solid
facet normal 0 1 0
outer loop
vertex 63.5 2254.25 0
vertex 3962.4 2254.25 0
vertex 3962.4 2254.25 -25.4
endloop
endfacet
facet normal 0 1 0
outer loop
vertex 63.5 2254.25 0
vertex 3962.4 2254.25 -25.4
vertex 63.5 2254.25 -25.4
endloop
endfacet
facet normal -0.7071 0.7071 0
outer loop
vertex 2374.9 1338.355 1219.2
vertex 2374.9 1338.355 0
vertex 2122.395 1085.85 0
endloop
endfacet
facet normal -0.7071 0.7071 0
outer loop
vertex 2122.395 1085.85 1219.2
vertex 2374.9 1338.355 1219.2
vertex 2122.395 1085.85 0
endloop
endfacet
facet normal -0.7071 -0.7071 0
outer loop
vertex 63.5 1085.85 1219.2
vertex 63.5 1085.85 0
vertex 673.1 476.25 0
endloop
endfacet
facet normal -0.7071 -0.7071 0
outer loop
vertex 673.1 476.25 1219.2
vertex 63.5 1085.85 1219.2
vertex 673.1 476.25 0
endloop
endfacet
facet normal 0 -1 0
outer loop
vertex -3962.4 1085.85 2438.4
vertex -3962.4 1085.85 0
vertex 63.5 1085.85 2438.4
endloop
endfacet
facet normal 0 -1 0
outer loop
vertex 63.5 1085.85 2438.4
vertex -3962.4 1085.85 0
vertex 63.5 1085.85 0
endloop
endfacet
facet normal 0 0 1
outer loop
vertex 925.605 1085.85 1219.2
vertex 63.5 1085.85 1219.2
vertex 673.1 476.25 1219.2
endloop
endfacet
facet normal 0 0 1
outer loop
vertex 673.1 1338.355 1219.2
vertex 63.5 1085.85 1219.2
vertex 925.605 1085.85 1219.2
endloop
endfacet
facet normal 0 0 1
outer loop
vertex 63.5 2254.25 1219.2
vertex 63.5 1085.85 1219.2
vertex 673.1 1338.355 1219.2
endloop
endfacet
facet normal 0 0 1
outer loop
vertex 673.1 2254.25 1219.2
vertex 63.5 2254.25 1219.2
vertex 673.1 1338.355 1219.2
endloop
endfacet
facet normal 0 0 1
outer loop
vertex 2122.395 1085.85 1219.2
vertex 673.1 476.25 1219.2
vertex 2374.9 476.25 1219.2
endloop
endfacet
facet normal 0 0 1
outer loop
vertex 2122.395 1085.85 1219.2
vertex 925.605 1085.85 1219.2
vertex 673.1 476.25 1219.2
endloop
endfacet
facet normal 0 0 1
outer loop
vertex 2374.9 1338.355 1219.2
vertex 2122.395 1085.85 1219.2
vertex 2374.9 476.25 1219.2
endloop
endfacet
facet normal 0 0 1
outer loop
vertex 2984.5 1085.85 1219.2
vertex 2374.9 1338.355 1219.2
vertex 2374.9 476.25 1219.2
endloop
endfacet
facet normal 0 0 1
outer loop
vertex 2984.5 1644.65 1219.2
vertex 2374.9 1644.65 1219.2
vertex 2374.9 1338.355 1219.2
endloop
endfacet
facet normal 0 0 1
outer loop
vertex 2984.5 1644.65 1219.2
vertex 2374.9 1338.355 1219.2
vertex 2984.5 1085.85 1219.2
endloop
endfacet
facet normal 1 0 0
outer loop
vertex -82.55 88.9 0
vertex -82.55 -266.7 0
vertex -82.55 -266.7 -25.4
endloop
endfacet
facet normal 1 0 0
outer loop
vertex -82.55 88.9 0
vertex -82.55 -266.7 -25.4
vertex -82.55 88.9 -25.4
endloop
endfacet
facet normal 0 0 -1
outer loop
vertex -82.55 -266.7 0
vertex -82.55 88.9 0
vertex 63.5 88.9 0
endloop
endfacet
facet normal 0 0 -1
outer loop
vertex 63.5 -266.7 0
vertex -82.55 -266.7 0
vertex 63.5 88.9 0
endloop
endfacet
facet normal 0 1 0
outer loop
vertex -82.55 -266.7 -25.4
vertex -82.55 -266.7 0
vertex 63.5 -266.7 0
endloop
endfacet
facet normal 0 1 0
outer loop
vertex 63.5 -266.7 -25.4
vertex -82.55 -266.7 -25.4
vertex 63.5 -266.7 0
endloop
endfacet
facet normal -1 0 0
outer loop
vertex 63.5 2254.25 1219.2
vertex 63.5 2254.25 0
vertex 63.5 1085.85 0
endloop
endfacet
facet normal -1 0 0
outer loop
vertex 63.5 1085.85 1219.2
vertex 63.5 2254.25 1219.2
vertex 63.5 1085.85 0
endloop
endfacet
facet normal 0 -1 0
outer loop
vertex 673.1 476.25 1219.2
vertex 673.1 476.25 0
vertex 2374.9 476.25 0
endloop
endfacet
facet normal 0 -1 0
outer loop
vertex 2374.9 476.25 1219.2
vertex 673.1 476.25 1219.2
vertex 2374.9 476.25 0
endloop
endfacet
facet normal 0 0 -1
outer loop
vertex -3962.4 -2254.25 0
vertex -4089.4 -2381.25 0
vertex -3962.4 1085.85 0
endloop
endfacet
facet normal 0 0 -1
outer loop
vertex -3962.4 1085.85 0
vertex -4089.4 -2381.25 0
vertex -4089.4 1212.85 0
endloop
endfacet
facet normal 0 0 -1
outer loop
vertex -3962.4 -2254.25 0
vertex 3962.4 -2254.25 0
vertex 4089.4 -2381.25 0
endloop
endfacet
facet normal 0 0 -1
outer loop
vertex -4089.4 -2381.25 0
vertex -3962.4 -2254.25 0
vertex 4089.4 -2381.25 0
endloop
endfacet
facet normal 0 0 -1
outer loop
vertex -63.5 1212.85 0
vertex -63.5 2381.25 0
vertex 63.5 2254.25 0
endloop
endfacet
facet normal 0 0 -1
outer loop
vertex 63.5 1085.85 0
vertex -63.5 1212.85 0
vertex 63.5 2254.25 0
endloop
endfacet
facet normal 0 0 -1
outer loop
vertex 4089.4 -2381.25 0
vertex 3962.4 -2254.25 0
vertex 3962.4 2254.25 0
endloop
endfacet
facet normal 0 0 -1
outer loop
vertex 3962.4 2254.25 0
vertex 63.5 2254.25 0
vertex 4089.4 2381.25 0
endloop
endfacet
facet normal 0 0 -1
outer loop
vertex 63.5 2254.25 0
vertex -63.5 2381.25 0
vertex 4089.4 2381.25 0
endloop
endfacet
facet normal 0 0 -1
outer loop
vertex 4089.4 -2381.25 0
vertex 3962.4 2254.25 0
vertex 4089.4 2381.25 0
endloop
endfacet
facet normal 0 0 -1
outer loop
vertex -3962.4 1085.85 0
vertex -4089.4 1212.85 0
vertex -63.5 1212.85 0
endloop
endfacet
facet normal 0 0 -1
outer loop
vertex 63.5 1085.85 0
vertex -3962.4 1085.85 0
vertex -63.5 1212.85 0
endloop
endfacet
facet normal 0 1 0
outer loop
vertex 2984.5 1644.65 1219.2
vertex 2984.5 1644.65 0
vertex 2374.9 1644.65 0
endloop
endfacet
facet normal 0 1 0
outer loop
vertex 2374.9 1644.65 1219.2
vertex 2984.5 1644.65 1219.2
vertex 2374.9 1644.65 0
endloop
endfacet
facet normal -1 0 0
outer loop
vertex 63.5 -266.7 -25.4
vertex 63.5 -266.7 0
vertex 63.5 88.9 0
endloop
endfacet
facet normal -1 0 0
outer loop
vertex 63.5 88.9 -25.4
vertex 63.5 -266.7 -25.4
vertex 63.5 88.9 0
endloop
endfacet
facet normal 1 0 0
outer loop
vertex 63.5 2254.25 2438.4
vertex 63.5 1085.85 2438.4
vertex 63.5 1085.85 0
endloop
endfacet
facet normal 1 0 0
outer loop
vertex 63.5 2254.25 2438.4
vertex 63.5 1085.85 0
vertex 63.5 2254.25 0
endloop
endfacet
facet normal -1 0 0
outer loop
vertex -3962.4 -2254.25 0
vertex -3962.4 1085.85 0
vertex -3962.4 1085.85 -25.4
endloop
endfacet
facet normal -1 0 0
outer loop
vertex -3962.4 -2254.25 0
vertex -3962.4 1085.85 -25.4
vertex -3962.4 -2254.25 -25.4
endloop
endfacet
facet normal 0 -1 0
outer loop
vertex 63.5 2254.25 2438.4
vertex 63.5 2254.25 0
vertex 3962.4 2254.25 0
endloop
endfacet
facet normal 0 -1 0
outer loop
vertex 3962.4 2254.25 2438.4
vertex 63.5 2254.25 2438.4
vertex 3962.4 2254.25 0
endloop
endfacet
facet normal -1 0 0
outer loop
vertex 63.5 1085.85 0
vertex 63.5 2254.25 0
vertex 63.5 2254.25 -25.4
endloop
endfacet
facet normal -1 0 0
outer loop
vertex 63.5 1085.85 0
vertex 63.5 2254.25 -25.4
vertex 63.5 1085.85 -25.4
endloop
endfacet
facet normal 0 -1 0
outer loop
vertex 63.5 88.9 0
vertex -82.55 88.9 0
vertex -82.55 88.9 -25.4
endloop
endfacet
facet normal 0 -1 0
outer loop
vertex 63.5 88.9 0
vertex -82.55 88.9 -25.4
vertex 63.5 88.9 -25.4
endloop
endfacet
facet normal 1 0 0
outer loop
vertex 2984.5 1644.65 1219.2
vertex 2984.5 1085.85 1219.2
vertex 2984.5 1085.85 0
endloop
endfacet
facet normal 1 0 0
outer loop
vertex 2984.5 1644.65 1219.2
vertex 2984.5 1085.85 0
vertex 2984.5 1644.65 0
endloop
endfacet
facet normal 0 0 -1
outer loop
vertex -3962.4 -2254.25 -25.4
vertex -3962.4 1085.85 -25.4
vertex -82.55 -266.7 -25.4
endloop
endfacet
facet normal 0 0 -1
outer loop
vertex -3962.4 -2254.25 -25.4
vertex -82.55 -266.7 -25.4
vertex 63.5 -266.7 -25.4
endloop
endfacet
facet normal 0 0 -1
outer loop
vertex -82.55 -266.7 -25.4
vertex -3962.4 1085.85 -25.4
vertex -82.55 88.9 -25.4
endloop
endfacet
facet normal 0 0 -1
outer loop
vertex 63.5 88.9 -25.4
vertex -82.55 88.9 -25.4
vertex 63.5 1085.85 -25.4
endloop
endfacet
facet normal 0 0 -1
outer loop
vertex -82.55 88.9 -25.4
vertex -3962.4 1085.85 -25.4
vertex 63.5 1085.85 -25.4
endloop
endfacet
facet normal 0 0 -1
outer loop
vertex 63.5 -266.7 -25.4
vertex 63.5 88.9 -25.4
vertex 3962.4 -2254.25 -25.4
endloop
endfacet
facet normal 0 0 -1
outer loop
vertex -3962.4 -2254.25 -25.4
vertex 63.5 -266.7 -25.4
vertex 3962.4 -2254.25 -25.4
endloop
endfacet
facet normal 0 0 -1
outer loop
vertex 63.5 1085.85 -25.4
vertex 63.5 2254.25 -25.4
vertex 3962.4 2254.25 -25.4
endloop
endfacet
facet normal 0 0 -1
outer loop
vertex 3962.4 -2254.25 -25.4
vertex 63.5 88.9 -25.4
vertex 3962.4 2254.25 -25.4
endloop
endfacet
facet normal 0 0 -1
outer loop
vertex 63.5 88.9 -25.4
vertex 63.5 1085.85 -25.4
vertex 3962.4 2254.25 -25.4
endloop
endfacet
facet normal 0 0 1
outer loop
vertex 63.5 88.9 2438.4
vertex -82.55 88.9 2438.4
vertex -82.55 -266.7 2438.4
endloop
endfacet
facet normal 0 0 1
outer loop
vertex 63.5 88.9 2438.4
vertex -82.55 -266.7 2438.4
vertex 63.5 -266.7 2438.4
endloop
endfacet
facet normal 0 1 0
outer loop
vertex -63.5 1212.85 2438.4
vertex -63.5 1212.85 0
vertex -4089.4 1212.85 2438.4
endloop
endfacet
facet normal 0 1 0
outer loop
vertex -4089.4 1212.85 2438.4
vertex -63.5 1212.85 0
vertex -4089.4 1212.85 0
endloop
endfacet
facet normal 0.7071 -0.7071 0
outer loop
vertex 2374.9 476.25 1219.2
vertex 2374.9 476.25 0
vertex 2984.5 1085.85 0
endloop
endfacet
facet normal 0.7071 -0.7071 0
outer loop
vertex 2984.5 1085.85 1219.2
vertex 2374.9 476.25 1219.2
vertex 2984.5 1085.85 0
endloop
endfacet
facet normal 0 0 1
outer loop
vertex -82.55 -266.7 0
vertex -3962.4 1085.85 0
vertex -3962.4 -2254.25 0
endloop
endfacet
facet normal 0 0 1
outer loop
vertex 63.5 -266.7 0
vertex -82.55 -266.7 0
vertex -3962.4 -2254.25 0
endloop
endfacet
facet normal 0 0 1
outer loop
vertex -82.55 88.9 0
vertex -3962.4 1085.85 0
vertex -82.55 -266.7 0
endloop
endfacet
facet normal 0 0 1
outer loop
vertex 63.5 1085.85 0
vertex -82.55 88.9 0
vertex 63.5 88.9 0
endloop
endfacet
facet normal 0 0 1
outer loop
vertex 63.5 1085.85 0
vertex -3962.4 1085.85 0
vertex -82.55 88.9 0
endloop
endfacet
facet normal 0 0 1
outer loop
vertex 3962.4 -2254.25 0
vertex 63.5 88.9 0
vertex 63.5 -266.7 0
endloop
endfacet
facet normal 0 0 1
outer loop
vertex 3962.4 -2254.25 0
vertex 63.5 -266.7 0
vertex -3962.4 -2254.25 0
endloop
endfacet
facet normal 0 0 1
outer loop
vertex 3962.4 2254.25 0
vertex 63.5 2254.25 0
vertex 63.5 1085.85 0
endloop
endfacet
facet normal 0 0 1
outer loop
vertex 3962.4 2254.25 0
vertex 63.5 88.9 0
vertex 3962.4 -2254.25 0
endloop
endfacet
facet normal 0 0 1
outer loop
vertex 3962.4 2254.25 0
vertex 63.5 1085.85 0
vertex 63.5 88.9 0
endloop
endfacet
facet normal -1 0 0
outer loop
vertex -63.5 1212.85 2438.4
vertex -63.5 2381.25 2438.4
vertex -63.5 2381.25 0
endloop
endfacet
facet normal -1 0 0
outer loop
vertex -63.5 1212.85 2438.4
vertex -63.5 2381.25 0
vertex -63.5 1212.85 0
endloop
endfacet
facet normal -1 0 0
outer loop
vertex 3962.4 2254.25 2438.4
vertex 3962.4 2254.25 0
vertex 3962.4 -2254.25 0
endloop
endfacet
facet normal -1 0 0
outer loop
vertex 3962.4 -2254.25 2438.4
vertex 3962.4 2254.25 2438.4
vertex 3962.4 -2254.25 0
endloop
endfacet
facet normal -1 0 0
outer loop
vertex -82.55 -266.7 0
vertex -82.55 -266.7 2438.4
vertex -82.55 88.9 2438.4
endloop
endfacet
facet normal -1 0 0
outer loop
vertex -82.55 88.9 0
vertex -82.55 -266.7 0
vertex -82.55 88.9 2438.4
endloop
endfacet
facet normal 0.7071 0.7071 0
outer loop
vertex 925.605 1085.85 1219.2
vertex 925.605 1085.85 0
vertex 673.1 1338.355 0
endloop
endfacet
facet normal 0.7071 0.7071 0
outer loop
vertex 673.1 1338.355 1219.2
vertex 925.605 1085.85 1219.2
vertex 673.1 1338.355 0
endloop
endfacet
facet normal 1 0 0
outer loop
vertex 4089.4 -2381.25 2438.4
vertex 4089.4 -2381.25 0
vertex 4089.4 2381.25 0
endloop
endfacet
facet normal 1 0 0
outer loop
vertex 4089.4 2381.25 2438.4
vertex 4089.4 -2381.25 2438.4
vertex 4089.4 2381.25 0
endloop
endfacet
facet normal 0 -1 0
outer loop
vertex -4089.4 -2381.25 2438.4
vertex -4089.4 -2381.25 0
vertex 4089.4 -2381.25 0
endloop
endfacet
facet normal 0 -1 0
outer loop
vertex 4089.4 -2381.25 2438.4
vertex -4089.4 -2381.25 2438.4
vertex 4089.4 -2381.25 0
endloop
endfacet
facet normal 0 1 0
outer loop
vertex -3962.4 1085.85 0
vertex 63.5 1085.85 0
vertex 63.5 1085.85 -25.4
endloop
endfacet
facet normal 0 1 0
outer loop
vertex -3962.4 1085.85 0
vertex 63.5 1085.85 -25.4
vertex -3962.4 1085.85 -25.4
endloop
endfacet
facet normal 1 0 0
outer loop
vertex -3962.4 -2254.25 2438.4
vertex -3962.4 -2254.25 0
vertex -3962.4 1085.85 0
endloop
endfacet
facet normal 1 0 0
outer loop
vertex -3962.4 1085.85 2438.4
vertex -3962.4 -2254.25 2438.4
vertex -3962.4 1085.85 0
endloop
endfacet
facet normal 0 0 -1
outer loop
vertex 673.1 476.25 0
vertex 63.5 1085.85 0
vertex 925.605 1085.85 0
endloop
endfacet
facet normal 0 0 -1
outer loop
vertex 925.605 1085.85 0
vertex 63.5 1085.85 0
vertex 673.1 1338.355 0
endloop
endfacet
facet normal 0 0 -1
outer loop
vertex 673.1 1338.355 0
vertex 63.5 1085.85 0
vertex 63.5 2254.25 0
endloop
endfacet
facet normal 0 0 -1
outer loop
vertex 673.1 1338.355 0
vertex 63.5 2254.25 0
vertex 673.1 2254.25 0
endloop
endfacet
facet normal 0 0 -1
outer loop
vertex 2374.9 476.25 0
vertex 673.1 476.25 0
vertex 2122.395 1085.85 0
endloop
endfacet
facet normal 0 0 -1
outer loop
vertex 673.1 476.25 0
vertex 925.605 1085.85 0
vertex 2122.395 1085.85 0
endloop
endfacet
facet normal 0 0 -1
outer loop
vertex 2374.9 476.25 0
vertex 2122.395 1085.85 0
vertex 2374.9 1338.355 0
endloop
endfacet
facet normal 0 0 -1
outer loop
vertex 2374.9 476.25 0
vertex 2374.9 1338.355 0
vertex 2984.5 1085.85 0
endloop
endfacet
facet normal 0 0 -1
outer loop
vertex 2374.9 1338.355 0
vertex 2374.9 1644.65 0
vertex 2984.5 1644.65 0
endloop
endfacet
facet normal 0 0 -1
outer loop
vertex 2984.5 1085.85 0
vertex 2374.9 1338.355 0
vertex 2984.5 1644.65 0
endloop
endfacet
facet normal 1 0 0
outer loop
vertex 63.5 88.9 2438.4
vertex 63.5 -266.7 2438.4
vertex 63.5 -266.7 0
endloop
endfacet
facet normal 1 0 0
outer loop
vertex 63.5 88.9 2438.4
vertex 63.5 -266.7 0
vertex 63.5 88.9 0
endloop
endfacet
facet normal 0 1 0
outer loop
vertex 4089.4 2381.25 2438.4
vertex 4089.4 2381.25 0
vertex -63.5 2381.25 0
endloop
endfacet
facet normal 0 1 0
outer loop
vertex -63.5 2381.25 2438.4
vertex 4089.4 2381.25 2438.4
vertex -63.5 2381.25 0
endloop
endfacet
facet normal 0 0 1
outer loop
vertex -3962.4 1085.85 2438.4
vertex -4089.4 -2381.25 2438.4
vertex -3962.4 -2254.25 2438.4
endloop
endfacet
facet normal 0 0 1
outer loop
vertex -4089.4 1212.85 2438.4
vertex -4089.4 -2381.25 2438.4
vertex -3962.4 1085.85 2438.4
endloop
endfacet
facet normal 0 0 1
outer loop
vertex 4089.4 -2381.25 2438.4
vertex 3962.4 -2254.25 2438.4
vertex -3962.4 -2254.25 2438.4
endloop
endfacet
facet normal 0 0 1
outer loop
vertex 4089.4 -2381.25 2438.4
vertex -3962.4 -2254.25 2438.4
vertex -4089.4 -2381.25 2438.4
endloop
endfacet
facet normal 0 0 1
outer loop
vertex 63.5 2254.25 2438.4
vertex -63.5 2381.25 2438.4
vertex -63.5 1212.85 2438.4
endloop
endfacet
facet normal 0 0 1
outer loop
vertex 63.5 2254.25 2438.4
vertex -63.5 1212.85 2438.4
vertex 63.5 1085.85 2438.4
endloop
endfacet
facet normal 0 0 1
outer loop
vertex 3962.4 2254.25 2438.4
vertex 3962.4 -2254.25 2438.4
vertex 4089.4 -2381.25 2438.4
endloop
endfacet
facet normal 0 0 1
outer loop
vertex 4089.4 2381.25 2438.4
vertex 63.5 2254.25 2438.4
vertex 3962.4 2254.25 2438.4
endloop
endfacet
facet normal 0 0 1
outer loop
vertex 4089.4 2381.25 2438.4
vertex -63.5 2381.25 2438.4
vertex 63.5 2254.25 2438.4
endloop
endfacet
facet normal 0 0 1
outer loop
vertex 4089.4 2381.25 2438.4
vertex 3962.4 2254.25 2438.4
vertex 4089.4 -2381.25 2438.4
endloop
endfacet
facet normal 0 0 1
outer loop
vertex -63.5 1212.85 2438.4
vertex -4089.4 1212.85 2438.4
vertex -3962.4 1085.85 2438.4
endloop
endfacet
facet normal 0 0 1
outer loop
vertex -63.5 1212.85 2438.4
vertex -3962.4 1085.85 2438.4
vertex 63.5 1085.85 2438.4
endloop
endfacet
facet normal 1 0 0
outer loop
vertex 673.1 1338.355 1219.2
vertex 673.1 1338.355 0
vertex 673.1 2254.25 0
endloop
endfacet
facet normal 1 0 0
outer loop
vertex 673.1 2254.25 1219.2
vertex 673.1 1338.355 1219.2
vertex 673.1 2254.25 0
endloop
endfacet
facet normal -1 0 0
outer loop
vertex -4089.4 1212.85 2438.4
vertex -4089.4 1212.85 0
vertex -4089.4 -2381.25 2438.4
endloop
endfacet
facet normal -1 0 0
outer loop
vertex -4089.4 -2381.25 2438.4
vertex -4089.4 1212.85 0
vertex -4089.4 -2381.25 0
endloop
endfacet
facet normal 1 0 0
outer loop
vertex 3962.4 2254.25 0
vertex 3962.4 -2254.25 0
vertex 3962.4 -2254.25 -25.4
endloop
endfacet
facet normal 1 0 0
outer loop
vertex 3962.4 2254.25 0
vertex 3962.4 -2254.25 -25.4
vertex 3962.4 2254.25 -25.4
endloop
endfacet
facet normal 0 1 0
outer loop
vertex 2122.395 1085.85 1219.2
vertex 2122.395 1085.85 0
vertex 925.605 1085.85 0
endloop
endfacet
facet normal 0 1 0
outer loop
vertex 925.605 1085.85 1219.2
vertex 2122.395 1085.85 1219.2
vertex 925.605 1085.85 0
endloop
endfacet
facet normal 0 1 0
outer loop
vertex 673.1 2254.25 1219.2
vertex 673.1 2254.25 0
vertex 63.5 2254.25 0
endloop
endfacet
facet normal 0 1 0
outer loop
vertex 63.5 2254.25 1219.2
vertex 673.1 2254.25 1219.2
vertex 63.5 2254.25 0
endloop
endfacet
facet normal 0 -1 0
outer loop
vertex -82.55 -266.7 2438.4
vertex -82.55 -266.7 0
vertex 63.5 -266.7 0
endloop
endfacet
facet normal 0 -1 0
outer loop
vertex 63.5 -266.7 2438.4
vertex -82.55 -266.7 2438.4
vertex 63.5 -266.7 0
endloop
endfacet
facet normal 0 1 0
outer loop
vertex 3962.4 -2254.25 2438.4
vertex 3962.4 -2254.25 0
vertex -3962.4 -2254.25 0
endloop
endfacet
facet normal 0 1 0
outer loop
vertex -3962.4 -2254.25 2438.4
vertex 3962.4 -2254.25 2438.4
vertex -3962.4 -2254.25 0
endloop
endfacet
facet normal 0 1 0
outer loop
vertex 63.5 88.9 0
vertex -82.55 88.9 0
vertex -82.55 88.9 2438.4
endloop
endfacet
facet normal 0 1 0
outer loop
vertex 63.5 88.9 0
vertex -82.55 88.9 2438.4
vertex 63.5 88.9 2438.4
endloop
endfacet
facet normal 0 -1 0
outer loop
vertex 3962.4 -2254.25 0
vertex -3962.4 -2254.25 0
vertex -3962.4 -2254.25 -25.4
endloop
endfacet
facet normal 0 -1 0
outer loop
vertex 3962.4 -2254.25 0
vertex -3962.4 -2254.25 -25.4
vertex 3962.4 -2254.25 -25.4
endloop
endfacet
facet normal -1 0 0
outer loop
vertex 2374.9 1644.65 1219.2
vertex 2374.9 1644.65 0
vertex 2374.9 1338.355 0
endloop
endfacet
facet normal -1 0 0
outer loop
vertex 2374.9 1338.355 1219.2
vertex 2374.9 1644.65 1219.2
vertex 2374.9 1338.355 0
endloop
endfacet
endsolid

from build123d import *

# Parameters (mm, degrees)
F1_DEPTH = 2438.4
F0_W     = 146.05
F0_H     = 355.6
F2_DEPTH = 25.4
F3_DEPTH = 2438.4
F5_DEPTH = 1219.2


with BuildPart() as f1:
    # F0 (on Top) → F1 (new body)
    with BuildSketch(Plane.XY):
        Polygon((4089.4, 2381.25), (-63.5, 2381.25), (-63.5, 1212.85), (-4089.4, 1212.85), (-4089.4, -2381.25), (4089.4, -2381.25), align=None)
        Polygon((63.5, 2254.25), (3962.4, 2254.25), (3962.4, -2254.25), (-3962.4, -2254.25), (-3962.4, 1085.85), (63.5, 1085.85), align=None, mode=Mode.SUBTRACT)
    extrude(amount=F1_DEPTH)

    # F0 (on Top) → F2 (join)
    with BuildSketch(Plane.XY):
        Polygon((3962.4, -2254.25), (3962.4, 2254.25), (63.5, 2254.25), (63.5, 1085.85), (-3962.4, 1085.85), (-3962.4, -2254.25), align=None)
        with Locations((-9.525, -88.9)):
            Rectangle(F0_W, F0_H, mode=Mode.SUBTRACT)
    extrude(amount=-F2_DEPTH)


with BuildPart() as f3:
    # F0 (on Top) → F3 (new body)
    with BuildSketch(Plane.XY):
        with Locations((-9.525, -88.9)):
            Rectangle(F0_W, F0_H)
    extrude(amount=F3_DEPTH)


with BuildPart() as f5:
    # F4 (on face) → F5 (new body)
    with BuildSketch(Plane.XY):
        Polygon((63.5, 2254.25), (63.5, 1085.85), (673.1, 476.25), (2374.9, 476.25), (2984.5, 1085.85), (2984.5, 1644.65), (2374.9, 1644.65), (2374.9, 1338.354588), (2122.395412, 1085.85), (925.604588, 1085.85), (673.1, 1338.354588), (673.1, 2254.25), align=None)
    extrude(amount=F5_DEPTH)


solid = Compound([f1.part, f3.part, f5.part])
